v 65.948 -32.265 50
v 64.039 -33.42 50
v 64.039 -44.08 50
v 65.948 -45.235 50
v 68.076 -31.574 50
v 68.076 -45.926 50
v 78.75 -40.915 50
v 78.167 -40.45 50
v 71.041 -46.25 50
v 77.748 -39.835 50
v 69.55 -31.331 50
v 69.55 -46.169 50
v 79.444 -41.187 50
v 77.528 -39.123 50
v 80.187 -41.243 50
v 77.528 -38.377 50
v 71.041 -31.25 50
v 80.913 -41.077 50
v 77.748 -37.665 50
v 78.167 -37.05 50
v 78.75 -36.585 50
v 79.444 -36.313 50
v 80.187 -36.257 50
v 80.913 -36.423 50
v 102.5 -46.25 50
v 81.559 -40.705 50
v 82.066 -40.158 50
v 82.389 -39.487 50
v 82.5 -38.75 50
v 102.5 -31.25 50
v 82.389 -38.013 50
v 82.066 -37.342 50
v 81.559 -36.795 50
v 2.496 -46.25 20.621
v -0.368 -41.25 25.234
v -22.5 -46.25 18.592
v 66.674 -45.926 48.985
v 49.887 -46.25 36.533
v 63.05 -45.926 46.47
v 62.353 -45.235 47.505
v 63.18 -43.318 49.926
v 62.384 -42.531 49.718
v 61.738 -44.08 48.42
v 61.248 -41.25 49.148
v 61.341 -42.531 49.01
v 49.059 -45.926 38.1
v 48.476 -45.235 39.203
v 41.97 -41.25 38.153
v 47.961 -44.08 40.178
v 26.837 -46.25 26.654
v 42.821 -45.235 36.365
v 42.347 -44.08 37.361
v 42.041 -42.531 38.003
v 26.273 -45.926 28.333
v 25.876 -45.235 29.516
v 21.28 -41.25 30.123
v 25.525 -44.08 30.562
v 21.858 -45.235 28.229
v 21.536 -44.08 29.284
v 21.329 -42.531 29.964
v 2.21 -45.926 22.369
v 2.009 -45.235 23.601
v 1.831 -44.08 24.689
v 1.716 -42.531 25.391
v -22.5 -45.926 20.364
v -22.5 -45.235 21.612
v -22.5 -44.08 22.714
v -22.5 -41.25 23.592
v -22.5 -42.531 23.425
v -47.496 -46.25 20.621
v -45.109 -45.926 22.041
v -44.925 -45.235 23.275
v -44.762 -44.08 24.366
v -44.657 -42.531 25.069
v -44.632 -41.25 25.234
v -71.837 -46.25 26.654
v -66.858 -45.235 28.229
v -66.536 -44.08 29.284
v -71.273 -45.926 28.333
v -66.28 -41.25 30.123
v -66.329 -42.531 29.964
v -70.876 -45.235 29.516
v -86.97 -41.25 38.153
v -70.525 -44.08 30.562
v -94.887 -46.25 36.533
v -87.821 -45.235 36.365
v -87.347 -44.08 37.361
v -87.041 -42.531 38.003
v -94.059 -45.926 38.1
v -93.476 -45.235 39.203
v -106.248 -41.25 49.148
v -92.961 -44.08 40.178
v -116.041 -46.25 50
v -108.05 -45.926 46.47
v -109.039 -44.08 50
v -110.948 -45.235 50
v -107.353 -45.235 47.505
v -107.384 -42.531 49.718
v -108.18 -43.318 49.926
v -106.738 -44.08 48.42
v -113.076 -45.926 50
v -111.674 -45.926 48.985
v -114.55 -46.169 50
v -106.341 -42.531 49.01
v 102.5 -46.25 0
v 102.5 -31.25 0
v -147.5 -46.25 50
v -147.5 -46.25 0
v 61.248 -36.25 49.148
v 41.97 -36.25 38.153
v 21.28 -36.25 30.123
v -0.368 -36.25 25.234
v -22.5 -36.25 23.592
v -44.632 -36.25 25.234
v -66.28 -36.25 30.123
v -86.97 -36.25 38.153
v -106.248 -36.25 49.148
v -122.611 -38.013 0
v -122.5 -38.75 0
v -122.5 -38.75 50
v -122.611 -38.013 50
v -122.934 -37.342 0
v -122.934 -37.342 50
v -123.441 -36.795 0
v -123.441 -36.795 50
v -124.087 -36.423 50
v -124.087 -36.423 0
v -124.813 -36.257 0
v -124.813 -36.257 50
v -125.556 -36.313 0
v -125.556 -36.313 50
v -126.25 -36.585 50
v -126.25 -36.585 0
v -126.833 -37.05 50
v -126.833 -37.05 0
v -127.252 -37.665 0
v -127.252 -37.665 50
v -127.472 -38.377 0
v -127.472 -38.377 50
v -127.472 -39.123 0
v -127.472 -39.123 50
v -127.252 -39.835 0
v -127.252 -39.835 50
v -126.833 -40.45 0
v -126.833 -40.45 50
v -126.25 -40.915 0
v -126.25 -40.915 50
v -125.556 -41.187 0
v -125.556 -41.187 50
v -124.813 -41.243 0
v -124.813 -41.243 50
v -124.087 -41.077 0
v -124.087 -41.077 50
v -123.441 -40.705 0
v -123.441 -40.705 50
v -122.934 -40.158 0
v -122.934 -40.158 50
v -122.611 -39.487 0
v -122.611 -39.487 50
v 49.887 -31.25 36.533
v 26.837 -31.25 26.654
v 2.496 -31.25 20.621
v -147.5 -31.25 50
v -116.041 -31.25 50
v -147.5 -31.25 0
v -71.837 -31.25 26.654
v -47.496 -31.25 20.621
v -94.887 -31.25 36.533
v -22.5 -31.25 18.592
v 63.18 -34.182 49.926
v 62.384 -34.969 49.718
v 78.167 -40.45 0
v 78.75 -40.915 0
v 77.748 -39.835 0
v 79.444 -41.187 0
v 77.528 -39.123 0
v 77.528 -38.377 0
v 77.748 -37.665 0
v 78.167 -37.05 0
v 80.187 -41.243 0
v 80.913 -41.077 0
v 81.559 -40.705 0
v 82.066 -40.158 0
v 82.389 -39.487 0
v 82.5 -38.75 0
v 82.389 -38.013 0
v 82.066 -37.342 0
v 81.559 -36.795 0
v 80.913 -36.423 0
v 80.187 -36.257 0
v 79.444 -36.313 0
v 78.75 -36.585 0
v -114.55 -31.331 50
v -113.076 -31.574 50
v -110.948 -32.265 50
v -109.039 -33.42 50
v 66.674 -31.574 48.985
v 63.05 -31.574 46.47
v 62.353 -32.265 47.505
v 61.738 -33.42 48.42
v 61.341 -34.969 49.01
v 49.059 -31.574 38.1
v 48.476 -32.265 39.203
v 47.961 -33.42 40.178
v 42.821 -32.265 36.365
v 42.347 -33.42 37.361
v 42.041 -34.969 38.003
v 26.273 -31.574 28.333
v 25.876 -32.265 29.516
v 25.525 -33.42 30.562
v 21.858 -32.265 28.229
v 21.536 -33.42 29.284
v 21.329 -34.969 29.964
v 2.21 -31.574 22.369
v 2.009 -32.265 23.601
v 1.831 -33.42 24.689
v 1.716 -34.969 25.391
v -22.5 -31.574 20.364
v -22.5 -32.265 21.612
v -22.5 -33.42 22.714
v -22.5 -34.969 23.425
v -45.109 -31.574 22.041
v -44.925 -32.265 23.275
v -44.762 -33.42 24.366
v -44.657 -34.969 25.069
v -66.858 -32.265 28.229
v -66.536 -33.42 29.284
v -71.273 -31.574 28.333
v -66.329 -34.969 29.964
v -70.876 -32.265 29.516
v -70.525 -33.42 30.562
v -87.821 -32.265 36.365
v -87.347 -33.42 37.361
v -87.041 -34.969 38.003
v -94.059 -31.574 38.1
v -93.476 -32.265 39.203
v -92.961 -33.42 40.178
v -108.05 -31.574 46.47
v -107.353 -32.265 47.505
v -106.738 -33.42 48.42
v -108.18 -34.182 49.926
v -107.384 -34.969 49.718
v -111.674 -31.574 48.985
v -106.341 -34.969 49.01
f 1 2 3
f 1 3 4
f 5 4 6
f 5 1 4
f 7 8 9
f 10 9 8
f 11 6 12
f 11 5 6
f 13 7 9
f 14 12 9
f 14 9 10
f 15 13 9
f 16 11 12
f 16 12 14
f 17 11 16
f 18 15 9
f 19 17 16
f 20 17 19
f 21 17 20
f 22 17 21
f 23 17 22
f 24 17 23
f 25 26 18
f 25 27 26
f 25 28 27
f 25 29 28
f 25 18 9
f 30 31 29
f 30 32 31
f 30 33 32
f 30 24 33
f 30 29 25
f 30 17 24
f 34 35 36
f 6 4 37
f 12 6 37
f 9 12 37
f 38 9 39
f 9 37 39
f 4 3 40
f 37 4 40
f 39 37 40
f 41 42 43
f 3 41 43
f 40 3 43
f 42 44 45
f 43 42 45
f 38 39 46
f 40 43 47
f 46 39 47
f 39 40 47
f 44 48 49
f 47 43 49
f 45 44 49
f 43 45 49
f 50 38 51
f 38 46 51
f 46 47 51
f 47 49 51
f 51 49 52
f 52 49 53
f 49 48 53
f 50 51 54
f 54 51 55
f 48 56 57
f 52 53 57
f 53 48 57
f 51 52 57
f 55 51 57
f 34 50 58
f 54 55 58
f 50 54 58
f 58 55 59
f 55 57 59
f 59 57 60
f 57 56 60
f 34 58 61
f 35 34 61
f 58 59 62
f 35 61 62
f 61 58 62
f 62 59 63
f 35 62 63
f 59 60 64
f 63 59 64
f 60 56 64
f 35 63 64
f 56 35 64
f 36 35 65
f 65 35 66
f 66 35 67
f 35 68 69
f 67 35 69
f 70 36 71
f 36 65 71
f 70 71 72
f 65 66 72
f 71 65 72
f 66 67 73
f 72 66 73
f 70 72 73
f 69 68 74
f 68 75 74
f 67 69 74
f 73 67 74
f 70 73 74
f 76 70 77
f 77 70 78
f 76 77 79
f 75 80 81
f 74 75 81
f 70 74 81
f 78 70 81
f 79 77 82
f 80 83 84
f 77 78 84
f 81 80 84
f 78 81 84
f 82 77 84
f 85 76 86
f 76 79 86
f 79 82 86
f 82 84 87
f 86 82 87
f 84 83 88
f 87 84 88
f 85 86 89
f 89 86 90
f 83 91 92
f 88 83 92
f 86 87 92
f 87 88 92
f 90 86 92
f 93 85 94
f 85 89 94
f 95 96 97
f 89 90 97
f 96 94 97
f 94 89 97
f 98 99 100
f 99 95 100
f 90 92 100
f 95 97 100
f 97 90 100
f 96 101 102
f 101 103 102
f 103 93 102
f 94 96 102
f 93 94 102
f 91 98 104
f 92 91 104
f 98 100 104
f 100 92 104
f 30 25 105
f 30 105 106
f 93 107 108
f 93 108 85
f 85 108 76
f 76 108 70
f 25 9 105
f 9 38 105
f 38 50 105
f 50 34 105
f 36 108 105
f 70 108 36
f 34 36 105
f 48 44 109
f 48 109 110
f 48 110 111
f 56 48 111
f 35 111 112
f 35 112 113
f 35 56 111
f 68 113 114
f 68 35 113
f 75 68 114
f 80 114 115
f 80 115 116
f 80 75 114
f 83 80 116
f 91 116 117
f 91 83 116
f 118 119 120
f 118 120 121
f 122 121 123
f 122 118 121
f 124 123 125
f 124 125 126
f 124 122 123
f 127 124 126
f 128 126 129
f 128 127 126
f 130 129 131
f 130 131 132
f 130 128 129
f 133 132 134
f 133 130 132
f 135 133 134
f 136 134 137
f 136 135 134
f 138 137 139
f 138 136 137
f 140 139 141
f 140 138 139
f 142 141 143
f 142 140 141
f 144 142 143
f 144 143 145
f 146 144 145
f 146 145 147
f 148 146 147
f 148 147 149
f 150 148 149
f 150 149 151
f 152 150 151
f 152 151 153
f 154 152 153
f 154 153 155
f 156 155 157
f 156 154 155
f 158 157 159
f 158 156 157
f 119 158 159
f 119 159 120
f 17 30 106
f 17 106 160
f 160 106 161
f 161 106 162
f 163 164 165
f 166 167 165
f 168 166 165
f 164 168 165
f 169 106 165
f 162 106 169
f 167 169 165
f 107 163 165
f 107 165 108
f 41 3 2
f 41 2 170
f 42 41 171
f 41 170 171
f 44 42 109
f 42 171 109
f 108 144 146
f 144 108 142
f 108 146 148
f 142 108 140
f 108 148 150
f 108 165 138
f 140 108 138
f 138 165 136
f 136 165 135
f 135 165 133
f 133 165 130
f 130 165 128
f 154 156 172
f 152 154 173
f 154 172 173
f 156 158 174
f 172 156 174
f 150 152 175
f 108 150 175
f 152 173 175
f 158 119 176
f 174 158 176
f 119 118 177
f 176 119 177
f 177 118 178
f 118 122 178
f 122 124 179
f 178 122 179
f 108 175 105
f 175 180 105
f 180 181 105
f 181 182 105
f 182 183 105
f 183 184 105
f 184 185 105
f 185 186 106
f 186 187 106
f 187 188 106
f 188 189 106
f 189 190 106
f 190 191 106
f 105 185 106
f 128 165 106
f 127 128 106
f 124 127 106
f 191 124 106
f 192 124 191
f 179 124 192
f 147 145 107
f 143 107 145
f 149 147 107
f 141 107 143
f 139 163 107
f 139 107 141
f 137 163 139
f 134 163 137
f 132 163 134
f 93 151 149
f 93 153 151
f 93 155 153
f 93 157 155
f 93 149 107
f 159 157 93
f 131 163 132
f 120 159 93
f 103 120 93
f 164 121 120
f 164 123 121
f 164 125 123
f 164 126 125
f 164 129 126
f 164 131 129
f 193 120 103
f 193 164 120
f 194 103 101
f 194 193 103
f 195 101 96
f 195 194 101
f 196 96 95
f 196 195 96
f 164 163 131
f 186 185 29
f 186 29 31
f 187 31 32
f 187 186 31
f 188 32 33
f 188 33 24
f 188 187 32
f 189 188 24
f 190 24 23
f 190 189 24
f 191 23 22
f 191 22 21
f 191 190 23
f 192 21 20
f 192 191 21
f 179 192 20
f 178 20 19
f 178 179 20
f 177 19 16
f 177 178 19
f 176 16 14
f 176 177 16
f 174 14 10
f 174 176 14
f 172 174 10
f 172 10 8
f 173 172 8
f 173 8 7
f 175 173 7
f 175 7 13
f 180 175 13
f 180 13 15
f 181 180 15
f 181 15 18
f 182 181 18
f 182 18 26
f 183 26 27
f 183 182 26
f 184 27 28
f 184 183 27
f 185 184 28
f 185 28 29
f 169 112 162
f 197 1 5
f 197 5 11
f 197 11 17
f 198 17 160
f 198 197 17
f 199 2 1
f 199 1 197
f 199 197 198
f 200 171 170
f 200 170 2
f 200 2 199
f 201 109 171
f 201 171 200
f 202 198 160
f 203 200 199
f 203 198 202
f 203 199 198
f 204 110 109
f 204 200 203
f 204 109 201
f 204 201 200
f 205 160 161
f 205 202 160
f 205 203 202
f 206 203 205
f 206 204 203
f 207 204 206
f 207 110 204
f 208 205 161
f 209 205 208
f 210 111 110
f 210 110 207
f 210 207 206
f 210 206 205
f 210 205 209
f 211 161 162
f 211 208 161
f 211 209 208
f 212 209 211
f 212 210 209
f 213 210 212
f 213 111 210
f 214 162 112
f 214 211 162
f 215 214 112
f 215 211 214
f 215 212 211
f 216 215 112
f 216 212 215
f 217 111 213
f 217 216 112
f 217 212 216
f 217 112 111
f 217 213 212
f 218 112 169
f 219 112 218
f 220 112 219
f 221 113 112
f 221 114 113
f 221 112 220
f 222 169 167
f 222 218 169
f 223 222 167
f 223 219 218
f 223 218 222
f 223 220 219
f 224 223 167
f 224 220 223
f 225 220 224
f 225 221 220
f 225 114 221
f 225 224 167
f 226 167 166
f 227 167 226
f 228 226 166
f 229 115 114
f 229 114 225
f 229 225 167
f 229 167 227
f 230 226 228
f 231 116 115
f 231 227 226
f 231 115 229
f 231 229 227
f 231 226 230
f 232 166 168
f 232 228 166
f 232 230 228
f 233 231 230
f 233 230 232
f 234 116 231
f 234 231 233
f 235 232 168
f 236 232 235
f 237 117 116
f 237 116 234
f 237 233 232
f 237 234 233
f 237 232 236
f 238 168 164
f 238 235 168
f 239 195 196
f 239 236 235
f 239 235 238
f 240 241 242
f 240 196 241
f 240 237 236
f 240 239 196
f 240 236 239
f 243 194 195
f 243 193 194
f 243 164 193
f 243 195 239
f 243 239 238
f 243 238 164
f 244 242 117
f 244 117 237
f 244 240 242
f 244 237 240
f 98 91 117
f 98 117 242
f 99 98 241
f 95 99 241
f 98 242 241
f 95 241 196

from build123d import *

# Parameters (mm, degrees)
SKETCH1_R           = 2.5
BOSS_EXTRUDE1_DEPTH = 50
CUT_EXTRUDE1_DEPTH  = 15
FILLET1_R           = 5


with BuildPart() as part:
    # Sketch1 → Boss-Extrude1 (new body)
    with BuildSketch(Plane.XY):
        Polygon((80, -46.25), (102.5, -46.25), (102.5, -31.25), (80, -31.25), (-147.5, -31.25), (-147.5, -46.25), align=None)
        with Locations((-125, -38.75)):
            Circle(SKETCH1_R, mode=Mode.SUBTRACT)
        with Locations((80, -38.75)):
            Circle(SKETCH1_R, mode=Mode.SUBTRACT)
    extrude(amount=BOSS_EXTRUDE1_DEPTH)

    # Sketch2 → Cut-Extrude1 (cut)
    with BuildSketch(Plane.XZ.offset(46.25)):
        with BuildLine():
            Line((-107.5, 50), (62.5, 50))
            ThreePointArc((62.5, 50), (-22.5, 23.592070943), (-107.5, 50))
        make_face()
    extrude(amount=-CUT_EXTRUDE1_DEPTH, mode=Mode.SUBTRACT)

    # Fillet1
    fillet1_edges = [part.edges().sort_by_distance(p)[0] for p in [
        (62.5, -38.75, 50),
        (-107.5, -38.75, 50),
        (-22.5, -46.25, 23.592070943),
        (-22.5, -31.25, 23.592070943),
    ]]
    fillet(fillet1_edges, radius=FILLET1_R)


solid = part.part
